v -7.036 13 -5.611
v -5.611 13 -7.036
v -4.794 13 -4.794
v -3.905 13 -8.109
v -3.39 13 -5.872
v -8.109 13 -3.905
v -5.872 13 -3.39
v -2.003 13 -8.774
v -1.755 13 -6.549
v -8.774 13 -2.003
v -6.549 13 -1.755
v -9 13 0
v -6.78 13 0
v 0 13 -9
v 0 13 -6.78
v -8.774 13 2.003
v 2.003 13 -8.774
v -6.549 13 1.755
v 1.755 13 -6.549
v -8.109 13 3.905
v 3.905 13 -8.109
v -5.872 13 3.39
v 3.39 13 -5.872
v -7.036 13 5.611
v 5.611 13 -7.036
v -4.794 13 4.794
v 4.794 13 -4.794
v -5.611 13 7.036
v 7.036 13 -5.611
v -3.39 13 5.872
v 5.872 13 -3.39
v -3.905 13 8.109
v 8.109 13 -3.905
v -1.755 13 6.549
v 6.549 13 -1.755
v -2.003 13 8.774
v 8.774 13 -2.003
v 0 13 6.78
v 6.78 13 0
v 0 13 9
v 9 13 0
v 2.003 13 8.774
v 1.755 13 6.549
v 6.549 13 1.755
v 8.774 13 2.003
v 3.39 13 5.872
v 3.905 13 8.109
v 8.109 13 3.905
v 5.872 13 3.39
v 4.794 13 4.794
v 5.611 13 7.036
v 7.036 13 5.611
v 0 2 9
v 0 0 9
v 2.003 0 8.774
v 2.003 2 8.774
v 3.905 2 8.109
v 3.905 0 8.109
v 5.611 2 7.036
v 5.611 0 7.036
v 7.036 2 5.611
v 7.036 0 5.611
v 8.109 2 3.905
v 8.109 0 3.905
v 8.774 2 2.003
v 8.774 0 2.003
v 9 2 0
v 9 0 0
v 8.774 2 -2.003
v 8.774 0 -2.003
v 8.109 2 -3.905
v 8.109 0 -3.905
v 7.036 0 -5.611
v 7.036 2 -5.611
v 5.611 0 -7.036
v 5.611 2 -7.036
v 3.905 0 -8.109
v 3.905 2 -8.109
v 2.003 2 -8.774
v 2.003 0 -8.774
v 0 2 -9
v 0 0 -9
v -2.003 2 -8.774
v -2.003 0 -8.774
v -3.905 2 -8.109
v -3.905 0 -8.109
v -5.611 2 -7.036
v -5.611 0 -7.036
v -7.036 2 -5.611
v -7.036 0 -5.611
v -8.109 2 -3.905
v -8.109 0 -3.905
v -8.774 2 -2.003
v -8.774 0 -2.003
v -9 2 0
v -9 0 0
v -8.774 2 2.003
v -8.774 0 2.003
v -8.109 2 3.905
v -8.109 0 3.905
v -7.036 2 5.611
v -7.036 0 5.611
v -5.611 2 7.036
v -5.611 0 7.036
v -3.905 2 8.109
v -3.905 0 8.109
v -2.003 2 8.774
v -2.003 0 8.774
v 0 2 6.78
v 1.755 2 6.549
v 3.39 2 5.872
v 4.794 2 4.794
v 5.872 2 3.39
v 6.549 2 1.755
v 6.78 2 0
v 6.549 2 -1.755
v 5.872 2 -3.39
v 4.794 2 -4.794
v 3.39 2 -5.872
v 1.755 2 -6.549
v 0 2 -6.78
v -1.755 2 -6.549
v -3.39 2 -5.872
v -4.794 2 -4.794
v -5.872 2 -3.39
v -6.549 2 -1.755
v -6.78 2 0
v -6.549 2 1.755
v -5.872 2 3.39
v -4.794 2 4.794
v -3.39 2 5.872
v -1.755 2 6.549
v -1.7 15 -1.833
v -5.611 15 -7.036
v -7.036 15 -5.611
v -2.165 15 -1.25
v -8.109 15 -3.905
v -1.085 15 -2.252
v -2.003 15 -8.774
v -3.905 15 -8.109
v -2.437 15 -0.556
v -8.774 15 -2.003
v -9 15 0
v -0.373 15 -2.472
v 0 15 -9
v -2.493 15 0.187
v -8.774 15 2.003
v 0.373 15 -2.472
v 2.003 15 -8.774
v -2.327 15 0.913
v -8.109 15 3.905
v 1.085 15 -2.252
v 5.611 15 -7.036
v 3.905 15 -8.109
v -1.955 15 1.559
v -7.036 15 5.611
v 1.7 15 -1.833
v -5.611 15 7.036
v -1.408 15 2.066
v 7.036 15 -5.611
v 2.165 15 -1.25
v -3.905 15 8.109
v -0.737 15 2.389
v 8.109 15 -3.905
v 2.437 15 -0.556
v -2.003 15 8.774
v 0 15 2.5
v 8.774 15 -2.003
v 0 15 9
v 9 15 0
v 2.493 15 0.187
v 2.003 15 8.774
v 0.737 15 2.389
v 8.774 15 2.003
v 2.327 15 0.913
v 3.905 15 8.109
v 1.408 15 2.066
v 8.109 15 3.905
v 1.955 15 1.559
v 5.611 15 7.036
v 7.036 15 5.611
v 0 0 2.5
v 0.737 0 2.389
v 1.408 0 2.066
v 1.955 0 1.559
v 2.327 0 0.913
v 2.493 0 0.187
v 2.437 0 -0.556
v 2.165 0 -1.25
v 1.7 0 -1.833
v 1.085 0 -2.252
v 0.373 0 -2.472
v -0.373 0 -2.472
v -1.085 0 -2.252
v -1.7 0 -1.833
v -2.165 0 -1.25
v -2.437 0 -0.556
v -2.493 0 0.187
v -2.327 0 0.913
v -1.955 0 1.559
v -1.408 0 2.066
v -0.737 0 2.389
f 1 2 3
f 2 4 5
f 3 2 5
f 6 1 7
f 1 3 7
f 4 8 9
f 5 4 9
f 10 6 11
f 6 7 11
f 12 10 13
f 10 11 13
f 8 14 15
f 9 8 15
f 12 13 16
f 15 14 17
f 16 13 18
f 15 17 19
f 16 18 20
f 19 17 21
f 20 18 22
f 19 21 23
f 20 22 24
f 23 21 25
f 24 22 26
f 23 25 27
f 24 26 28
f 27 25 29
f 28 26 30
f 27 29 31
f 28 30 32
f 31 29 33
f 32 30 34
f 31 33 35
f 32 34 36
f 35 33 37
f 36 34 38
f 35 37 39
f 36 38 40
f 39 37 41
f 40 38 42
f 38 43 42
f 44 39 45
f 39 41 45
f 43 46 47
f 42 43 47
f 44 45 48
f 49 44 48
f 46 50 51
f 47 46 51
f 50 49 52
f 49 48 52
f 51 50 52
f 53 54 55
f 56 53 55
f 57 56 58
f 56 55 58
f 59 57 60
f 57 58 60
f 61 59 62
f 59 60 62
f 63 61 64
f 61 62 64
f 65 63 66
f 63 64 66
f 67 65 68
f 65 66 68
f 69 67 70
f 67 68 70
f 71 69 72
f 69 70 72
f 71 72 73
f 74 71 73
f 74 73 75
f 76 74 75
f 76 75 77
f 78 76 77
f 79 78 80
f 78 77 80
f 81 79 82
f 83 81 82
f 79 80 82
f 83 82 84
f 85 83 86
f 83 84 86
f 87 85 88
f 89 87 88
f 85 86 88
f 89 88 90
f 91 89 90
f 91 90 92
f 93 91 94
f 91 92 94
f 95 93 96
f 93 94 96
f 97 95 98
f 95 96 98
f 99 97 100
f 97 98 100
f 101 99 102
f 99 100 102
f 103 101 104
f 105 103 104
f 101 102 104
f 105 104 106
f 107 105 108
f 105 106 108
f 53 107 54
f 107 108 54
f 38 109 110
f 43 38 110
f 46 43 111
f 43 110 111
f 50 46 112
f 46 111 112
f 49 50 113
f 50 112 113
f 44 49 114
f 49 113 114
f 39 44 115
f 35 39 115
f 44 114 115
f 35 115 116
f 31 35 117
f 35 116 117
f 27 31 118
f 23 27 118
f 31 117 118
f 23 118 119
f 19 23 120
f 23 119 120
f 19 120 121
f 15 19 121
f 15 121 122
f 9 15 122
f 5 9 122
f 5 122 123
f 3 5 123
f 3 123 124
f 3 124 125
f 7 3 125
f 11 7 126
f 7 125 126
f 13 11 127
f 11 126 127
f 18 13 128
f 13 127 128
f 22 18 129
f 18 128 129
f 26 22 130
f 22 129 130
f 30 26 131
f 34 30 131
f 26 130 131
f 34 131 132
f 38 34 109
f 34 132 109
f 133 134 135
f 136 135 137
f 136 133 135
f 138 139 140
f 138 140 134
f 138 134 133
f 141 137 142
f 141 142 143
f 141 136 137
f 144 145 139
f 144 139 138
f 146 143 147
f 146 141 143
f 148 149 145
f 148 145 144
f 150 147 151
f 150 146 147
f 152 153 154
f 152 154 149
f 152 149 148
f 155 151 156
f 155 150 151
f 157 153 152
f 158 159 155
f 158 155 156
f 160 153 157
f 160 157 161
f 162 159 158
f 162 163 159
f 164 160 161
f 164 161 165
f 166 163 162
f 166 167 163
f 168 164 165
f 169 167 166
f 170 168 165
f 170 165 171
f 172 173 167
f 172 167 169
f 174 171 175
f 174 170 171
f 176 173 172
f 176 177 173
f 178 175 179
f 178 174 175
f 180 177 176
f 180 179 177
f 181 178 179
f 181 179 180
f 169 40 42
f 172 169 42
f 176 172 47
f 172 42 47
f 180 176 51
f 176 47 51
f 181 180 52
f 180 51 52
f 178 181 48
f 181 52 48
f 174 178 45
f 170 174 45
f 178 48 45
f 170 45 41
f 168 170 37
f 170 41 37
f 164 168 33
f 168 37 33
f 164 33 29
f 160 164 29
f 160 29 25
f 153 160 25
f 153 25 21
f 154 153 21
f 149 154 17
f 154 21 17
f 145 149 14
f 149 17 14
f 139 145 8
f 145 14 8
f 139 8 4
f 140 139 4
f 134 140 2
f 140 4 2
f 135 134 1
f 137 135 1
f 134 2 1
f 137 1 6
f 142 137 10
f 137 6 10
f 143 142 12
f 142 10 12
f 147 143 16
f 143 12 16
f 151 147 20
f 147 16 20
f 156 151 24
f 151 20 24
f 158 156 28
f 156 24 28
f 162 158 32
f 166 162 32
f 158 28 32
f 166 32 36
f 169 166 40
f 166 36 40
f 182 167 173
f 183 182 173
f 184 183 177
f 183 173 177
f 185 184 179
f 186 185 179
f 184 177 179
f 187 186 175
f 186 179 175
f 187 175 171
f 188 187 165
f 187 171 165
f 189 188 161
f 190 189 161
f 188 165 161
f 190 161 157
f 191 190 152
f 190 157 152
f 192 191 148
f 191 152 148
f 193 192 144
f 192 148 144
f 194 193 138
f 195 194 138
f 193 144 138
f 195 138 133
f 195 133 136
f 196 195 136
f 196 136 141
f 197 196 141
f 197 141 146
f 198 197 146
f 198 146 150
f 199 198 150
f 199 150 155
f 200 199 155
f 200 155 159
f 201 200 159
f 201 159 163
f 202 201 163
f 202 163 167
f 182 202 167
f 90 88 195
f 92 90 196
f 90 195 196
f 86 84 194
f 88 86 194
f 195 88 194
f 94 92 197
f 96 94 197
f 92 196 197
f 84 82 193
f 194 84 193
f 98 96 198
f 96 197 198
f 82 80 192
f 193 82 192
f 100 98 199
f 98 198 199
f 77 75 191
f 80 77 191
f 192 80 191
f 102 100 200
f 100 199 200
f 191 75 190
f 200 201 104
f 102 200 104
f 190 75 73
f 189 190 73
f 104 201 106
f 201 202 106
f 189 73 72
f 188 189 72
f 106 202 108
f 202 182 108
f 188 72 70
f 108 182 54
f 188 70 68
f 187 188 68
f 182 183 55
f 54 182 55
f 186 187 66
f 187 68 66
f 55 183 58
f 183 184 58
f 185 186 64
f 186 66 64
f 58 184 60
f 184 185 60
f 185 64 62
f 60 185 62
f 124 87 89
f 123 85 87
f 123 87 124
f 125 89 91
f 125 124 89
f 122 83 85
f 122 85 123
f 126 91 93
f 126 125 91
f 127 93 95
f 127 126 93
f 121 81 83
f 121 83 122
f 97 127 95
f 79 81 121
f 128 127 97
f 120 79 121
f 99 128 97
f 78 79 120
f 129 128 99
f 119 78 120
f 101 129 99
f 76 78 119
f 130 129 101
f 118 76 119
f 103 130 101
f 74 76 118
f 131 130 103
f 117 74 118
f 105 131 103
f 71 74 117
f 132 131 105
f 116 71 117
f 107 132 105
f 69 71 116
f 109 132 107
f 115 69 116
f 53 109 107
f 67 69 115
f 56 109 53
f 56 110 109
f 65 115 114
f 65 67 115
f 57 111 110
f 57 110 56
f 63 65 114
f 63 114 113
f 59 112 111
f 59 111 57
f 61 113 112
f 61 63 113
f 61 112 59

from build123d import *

# Parameters (mm, degrees)
SKETCH_1_R          = 9
EXTRUDE_1_DEPTH     = 2
SKETCH_2_R          = 6.78
EXTRUDE_2_DEPTH     = 11
SKETCH_3_R          = 9
EXTRUDE_3_DEPTH     = 2
SKETCH_4_R          = 2.5
CUT_EXTRUDE_1_DEPTH = 26


with BuildPart() as part:
    # 草图1 → 凸台-拉伸1 (new body)
    with BuildSketch(Plane(origin=(0, 0, 0), x_dir=(1, 0, 0), z_dir=(0, 1, 0))):
        with Locations(Location((0, 0, 0), (0, 0, 270))):
            Circle(SKETCH_1_R)
    extrude(amount=EXTRUDE_1_DEPTH)

    # 草图2 → 凸台-拉伸2 (add)
    with BuildSketch(Plane(origin=(0, 2, 0), x_dir=(1, 0, 0), z_dir=(0, 1, 0))):
        with Locations(Location((0, 0, 0), (0, 0, 270))):
            Circle(SKETCH_2_R)
    extrude(amount=EXTRUDE_2_DEPTH)

    # 草图3 → 凸台-拉伸3 (add)
    with BuildSketch(Plane(origin=(0, 13, 0), x_dir=(1, 0, 0), z_dir=(0, 1, 0))):
        with Locations(Location((0, 0, 0), (0, 0, 270))):
            Circle(SKETCH_3_R)
    extrude(amount=EXTRUDE_3_DEPTH)

    # 草图4 → 切除-拉伸1 (cut)
    with BuildSketch(Plane(origin=(0, 15, 0), x_dir=(1, 0, 0), z_dir=(0, 1, 0))):
        with Locations(Location((0, 0, 0), (0, 0, 270))):
            Circle(SKETCH_4_R)
    extrude(amount=-CUT_EXTRUDE_1_DEPTH, mode=Mode.SUBTRACT)


solid = part.part
